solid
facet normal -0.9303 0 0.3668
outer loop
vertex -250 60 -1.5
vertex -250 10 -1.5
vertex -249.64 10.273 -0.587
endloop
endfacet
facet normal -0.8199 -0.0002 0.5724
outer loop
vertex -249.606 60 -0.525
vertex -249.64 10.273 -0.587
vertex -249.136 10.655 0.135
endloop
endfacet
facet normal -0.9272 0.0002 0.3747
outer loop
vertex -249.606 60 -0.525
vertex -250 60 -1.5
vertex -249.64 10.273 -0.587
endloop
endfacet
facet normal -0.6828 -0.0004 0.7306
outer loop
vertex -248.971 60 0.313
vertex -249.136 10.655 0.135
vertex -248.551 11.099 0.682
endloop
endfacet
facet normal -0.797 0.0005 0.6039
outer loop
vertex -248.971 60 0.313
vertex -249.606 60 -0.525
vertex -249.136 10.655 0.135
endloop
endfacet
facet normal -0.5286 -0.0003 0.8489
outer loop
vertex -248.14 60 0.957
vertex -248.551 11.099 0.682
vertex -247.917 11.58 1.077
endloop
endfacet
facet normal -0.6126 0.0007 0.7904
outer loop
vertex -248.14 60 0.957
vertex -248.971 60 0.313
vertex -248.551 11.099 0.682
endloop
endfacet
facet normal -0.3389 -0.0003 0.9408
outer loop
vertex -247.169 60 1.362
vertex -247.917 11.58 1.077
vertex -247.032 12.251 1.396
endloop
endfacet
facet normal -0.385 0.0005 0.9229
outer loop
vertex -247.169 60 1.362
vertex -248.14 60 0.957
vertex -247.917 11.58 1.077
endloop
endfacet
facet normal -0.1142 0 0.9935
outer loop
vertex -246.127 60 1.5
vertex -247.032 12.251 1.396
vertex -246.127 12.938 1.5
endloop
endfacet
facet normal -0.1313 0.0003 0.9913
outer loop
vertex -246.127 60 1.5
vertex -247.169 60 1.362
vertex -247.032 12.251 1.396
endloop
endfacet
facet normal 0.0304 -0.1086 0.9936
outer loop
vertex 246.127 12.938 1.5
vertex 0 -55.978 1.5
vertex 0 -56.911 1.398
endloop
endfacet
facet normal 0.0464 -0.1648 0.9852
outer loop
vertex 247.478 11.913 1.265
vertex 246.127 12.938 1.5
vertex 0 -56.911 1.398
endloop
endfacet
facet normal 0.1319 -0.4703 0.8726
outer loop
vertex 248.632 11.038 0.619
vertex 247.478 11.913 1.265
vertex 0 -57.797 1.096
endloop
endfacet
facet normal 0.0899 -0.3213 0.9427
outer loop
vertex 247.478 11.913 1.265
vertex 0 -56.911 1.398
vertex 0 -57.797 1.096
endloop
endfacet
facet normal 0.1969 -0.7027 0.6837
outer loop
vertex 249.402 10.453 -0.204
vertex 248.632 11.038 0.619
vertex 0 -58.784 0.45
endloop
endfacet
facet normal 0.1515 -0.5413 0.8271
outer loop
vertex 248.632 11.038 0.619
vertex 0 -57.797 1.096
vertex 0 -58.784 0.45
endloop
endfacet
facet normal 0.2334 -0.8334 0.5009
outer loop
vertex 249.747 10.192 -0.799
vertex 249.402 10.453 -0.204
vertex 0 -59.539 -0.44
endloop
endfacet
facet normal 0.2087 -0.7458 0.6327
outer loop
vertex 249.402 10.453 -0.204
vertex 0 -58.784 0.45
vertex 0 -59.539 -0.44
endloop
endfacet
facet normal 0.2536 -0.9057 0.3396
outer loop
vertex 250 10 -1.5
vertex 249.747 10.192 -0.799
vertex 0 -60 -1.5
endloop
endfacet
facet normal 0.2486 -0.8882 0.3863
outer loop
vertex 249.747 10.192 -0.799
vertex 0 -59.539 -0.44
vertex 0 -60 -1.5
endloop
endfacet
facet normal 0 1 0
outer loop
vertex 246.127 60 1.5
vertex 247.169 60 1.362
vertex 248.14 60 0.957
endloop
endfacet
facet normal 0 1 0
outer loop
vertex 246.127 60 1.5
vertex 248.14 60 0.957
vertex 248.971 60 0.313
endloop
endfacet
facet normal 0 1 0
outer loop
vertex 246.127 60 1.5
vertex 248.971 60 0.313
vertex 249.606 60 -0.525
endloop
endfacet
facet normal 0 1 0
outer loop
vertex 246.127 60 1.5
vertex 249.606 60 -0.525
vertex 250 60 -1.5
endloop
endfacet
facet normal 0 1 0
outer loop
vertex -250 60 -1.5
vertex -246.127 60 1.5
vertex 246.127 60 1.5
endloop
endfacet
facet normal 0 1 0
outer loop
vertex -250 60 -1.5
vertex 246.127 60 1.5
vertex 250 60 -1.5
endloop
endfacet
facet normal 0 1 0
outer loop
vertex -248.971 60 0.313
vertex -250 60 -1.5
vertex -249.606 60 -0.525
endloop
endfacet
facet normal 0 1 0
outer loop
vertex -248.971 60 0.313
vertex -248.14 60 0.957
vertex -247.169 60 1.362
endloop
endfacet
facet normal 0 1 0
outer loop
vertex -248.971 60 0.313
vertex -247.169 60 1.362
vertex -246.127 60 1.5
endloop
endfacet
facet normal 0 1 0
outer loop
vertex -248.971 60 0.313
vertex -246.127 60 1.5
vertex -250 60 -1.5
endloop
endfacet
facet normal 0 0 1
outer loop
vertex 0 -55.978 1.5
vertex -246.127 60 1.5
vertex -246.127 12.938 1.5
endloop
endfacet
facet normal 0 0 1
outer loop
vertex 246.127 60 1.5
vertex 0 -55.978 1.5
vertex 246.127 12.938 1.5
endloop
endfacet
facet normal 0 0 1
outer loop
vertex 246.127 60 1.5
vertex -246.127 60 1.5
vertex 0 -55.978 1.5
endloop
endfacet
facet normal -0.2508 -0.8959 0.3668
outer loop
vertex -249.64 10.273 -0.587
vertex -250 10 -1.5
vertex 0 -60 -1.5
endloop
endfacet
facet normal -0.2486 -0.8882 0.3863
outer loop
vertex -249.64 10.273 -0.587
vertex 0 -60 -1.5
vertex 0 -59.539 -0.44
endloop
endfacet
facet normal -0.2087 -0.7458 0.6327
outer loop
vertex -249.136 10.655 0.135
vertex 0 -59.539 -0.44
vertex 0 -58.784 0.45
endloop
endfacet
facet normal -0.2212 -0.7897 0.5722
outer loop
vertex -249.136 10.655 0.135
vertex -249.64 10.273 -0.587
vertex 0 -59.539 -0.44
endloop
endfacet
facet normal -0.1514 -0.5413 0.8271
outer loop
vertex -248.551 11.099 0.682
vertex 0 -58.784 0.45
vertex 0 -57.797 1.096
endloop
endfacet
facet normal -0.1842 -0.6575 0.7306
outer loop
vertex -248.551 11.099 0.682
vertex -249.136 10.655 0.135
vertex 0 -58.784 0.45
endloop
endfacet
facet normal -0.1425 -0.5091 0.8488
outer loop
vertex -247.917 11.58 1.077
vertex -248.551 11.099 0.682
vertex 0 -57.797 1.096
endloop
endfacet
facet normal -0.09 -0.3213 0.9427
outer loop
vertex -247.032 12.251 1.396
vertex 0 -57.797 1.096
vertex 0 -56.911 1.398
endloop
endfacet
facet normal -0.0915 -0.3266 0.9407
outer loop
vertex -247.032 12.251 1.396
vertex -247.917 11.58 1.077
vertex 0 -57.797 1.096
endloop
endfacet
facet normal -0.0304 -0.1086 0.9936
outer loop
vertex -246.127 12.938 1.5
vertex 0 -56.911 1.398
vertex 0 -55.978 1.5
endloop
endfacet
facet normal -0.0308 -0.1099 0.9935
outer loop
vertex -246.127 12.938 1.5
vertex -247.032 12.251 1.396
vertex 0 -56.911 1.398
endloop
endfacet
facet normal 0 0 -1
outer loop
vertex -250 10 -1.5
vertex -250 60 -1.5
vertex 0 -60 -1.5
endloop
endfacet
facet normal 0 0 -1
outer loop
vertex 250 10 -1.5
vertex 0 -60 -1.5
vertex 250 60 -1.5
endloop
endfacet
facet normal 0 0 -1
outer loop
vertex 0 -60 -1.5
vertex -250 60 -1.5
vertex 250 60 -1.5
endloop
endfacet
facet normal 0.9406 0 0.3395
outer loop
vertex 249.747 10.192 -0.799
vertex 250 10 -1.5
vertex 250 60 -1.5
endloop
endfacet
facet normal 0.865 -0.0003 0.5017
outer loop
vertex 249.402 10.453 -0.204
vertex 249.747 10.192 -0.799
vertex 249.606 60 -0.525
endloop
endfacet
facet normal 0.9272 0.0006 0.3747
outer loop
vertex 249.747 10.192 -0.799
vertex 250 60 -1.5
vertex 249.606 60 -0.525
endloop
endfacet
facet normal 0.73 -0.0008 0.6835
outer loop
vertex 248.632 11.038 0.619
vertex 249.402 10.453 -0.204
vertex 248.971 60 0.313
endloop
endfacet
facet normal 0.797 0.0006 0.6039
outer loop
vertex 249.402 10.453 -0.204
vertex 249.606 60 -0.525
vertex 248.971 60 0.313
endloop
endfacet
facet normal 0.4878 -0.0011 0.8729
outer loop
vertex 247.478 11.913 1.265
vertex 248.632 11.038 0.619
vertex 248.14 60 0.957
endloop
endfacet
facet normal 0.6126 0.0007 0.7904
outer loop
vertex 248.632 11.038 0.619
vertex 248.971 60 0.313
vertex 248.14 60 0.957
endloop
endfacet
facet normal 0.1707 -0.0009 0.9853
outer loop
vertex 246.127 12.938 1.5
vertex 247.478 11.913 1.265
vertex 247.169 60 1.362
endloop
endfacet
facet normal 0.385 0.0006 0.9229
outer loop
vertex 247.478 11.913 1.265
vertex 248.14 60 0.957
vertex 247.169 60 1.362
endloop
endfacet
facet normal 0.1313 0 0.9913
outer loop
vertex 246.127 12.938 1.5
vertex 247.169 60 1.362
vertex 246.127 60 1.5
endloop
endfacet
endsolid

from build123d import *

# Parameters (mm, degrees)
F1_DEPTH    = 1.5
F2_T1_DEPTH = 69.364916731
F2_T3_DEPTH = 278.980016446
F2_T5_DEPTH = 278.980016446


# Not quite as in the source:
# - a fillet or chamfer that OpenCascade refuses, or shapes differently, is made with other operations: its cross-section is extruded or revolved along the edge and cut away or added


with BuildPart() as f1:
    # F0 (on Top) → F1 (new body, symmetric)
    with BuildSketch(Plane.XY):
        Polygon((-250, 10), (0, -60), (0, 60), (-250, 60), align=None)
        Polygon((0, 60), (0, -60), (250, 10), (250, 60), align=None)
    extrude(amount=F1_DEPTH, both=True)

    # F2: fillet of radius 4 on 4 edges, made by hand

    # F2_s2 → F2_t1 (cut)
    with BuildSketch(Plane.XZ.offset(-69.6824583655)):
        with BuildLine():
            ThreePointArc((250, -1.5), (248.5765063966, 0.6622776602), (246.1270166538, 1.5))
            Line((246.1270166538, 1.5), (250, 1.5))
            Line((250, 1.5), (250, -1.5))
        make_face()
        with BuildLine():
            ThreePointArc((-250, -1.5), (-248.5765063966, 0.6622776602), (-246.1270166538, 1.5))
            Line((-246.1270166538, 1.5), (-250, 1.5))
            Line((-250, 1.5), (-250, -1.5))
        make_face()
    extrude(amount=F2_T1_DEPTH, mode=Mode.SUBTRACT)

    # F2_s4 → F2_t3 (cut)
    with BuildSketch(Plane(origin=(-24.9024940432, -6.9726983321, 0), x_dir=(0, 0, 1), z_dir=(0.9629640197, 0.2696299255, 0))):
        with BuildLine():
            ThreePointArc((1.5, 53.9048578366), (0.6622776602, 56.3543475794), (-1.5, 57.7778411829))
            Line((-1.5, 57.7778411829), (1.5, 57.7778411829))
            Line((1.5, 57.7778411829), (1.5, 53.9048578366))
        make_face()
    extrude(amount=F2_T3_DEPTH, mode=Mode.SUBTRACT)

    # F2_s6 → F2_t5 (cut)
    with BuildSketch(Plane(origin=(-243.7452240135, 68.2486627238, 0), x_dir=(0, 0, 1), z_dir=(0.9629640197, -0.2696299255, 0))):
        with BuildLine():
            ThreePointArc((-1.5, 57.7778411829), (0.6622776602, 56.3543475794), (1.5, 53.9048578366))
            Line((1.5, 53.9048578366), (1.5, 57.7778411829))
            Line((1.5, 57.7778411829), (-1.5, 57.7778411829))
        make_face()
    extrude(amount=F2_T5_DEPTH, mode=Mode.SUBTRACT)


solid = f1.part
